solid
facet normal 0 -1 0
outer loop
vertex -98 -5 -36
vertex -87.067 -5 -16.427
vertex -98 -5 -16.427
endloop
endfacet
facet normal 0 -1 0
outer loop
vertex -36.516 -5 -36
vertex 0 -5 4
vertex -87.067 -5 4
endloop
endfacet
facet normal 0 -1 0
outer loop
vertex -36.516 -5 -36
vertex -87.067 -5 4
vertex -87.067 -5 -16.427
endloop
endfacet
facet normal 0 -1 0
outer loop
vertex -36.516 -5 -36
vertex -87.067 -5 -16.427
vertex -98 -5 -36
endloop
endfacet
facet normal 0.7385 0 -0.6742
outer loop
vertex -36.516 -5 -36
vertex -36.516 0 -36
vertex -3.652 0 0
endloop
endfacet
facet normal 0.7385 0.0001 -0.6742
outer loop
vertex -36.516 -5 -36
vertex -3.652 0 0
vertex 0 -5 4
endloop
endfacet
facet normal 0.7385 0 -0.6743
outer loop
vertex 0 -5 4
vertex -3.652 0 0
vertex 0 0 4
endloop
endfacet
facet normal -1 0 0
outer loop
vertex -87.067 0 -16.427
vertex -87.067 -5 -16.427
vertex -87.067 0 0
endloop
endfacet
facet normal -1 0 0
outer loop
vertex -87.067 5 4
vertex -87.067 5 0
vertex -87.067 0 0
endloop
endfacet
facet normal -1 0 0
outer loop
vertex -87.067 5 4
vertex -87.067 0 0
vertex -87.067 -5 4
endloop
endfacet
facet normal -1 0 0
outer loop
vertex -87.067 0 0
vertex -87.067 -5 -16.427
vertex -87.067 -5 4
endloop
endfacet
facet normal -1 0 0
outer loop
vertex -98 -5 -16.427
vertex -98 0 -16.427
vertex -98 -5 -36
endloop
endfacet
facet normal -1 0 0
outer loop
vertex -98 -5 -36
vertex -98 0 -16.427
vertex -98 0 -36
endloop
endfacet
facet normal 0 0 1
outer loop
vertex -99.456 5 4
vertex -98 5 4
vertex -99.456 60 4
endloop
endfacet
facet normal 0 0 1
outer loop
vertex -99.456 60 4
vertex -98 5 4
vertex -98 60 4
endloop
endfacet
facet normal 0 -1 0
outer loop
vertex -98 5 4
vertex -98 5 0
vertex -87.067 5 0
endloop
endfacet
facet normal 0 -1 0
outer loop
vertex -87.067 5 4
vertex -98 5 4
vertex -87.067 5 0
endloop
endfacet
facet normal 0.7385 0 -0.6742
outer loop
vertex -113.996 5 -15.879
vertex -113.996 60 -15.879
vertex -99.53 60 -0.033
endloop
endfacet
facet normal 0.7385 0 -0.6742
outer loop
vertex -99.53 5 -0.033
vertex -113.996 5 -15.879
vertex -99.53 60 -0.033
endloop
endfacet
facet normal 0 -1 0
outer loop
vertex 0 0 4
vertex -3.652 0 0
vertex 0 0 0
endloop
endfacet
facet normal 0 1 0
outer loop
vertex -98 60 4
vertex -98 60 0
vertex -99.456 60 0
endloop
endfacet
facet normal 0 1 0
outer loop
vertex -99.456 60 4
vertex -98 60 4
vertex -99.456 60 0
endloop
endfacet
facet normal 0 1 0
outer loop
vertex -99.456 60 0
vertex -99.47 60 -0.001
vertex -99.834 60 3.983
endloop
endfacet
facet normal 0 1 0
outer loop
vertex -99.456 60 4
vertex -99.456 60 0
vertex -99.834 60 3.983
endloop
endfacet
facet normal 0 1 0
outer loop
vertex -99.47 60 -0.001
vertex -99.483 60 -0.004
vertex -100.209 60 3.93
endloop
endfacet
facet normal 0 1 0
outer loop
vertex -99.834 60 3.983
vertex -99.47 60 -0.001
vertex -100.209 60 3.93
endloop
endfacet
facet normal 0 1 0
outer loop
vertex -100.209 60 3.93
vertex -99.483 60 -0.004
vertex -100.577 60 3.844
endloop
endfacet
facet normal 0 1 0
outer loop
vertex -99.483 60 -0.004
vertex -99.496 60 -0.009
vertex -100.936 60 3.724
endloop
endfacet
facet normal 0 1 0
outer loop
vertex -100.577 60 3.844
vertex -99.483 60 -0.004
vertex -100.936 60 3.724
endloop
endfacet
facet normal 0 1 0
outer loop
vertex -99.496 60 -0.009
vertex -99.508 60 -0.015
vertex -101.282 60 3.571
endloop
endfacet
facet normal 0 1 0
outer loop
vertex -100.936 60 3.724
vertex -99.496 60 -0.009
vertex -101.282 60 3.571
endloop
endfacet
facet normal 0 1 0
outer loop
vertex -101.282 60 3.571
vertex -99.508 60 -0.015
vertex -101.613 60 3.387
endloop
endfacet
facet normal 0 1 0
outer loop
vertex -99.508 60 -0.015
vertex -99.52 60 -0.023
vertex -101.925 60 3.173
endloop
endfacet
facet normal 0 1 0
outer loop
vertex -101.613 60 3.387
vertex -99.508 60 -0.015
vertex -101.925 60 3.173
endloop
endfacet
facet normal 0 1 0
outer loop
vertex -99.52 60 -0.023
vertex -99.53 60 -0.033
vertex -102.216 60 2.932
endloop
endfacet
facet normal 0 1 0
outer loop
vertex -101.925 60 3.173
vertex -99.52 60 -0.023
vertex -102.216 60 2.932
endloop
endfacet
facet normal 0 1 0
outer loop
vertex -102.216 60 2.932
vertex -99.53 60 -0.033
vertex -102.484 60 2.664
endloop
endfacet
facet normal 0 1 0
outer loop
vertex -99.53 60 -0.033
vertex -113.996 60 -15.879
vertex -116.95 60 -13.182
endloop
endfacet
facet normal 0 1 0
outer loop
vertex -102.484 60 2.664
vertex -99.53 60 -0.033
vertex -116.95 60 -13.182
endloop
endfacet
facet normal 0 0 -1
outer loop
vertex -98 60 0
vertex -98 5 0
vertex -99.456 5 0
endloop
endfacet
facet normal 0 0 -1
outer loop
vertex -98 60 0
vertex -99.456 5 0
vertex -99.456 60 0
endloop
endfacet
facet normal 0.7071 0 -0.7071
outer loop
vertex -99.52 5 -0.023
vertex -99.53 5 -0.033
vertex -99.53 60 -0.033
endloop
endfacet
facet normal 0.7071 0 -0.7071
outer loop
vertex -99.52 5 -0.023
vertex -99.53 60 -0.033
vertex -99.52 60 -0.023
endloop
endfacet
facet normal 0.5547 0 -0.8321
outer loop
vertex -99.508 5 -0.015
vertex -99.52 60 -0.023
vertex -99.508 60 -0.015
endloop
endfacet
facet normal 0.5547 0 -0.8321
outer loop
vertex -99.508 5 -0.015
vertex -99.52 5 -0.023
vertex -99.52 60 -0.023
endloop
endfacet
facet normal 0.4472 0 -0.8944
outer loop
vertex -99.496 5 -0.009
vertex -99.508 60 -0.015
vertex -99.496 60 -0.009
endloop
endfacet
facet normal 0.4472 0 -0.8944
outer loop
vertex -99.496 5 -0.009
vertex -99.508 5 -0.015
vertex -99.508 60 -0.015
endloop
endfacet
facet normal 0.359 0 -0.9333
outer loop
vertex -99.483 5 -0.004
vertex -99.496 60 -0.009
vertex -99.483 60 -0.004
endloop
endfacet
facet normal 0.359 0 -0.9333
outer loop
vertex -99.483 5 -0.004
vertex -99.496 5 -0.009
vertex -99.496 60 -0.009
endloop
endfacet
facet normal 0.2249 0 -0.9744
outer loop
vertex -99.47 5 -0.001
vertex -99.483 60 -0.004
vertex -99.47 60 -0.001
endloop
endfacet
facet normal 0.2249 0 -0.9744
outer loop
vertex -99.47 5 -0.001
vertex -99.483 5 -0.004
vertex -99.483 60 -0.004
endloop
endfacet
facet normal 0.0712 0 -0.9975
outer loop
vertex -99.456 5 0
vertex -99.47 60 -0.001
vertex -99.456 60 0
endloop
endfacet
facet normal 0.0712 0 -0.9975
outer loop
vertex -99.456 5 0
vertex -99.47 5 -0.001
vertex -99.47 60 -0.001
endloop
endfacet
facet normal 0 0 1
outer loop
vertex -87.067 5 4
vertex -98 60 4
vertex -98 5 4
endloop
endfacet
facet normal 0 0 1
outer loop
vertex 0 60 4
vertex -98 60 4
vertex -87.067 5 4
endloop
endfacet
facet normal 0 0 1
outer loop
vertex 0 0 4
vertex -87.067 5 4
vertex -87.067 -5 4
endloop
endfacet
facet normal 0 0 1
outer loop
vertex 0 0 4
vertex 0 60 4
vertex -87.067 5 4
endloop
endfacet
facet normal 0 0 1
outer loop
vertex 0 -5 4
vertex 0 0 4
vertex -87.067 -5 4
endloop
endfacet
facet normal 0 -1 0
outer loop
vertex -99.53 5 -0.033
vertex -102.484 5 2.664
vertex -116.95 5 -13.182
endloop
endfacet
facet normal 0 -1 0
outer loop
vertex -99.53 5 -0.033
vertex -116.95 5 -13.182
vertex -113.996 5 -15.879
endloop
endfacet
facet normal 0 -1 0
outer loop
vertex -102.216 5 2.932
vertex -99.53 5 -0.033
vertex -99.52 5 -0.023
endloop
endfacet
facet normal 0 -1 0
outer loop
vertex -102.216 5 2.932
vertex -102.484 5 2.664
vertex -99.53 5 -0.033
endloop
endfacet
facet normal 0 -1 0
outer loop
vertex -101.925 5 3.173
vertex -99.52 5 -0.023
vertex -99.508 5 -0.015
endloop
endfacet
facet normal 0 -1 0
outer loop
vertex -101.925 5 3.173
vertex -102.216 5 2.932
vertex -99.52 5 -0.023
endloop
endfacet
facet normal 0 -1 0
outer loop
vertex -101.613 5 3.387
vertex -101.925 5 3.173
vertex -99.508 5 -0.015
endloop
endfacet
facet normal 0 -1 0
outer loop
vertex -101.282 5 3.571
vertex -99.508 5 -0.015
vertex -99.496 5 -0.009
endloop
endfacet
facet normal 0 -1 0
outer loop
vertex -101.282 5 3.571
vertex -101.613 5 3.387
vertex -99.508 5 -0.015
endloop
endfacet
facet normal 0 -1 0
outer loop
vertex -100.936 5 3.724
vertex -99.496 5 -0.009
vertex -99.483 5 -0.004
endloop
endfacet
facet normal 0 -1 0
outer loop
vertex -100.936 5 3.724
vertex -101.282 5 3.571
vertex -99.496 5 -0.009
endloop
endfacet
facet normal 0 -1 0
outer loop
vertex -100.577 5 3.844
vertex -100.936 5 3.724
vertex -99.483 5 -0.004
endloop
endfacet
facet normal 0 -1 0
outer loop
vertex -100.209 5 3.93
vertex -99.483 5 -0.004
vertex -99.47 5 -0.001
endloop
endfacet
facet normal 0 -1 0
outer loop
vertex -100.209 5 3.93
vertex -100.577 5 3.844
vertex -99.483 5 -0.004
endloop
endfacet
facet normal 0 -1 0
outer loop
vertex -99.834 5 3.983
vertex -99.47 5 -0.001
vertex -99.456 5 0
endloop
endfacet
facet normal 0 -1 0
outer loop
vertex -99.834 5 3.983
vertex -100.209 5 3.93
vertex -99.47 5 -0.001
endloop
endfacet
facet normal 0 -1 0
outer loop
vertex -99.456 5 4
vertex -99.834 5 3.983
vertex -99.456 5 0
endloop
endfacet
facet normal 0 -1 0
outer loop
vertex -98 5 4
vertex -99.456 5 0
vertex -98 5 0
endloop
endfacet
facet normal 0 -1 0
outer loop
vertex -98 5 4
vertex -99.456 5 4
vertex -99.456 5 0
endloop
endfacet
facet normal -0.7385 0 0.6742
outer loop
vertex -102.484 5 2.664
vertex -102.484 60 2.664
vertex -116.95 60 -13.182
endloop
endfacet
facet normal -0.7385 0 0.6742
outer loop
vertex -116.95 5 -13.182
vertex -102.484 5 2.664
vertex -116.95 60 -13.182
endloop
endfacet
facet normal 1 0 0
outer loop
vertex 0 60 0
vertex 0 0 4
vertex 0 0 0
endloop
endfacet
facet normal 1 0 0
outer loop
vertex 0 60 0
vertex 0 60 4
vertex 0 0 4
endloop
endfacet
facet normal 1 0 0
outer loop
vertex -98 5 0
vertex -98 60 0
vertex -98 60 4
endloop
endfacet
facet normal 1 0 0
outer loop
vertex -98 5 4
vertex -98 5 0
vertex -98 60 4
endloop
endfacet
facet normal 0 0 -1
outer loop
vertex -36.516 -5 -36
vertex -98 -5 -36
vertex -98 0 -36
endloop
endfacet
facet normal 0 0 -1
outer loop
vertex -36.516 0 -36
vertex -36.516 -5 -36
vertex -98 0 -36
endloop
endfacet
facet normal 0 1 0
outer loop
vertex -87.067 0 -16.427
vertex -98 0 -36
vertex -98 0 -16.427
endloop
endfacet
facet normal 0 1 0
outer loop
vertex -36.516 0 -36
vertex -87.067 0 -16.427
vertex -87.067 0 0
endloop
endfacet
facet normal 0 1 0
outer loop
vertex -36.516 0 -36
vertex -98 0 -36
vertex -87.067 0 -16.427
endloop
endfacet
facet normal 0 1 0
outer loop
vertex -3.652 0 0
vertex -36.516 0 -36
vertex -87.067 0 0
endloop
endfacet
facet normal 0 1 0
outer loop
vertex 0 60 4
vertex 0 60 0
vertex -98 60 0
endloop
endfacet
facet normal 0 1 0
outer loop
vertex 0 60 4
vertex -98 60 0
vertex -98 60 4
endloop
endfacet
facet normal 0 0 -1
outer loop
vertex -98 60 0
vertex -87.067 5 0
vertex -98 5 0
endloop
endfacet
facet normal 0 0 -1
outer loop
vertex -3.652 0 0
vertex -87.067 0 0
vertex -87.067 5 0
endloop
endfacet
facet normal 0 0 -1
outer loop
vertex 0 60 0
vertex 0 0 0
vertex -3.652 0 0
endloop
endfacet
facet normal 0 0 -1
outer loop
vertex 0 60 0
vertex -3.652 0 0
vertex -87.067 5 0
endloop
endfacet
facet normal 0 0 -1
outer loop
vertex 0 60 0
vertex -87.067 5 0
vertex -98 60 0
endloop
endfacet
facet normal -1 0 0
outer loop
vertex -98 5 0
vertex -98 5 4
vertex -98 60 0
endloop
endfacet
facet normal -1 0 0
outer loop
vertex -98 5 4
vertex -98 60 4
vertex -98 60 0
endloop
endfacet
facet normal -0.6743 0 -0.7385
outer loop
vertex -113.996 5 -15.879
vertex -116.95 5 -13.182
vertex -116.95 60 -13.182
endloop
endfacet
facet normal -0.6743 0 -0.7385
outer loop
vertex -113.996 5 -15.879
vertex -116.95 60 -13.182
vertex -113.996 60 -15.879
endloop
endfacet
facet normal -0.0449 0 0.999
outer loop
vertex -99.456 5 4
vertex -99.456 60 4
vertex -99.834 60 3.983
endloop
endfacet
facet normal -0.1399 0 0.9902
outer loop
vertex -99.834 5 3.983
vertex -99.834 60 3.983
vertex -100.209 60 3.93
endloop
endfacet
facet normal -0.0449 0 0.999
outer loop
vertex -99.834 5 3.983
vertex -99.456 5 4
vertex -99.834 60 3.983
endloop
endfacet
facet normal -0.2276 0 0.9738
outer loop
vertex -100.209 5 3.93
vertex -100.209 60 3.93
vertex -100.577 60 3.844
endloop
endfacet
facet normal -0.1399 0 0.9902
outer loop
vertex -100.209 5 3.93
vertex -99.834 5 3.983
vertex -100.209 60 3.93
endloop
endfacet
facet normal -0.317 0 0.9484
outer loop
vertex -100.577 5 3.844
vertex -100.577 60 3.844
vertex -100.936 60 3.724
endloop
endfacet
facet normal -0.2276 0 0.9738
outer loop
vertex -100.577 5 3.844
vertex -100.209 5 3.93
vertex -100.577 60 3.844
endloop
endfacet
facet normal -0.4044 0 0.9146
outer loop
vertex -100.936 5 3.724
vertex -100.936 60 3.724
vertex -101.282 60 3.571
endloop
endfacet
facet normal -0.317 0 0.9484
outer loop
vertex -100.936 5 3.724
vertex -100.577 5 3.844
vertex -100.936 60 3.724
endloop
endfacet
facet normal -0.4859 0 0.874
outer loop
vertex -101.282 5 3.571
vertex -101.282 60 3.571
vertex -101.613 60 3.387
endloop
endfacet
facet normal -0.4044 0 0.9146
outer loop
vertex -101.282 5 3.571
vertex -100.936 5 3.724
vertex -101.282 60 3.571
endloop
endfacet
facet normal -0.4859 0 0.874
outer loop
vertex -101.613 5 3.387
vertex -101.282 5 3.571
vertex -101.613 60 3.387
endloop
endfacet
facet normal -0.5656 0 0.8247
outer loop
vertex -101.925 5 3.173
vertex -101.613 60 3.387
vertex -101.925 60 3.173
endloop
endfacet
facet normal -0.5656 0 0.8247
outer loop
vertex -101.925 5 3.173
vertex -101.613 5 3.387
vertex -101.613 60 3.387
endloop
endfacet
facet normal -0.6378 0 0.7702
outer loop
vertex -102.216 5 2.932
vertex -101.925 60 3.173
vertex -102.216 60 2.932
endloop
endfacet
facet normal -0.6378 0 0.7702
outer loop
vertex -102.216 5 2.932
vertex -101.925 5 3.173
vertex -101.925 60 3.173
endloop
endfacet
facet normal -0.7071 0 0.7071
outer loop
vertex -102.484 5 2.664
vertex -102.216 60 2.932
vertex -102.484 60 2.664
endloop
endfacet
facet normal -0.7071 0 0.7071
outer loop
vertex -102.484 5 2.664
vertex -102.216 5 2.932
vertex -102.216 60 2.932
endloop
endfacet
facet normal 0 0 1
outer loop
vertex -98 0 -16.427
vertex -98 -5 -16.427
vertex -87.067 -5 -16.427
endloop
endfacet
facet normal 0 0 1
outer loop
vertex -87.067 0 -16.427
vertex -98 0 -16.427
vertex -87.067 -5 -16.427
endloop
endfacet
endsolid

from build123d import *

# Parameters (mm, degrees)
EXTRUDE_1_DEPTH                  = 98
CUT_EXTRUDE_1_DEPTH              = 121.415945788
CUT_EXTRUDE_START                = 5
SKETCH_3_W                       = 12.842534068
SKETCH_3_H                       = 17.787416892
CUT_EXTRUDE_2_DEPTH              = 126.415945788
SKETCH_4_W                       = 4
SKETCH_4_H                       = 65
SM_BASE_FLANGE_1_DEPTH           = 1.5
SM_EDGE_FLANGE_1_STRIP_CUT_DEPTH = 65
SM_EDGE_FLANGE_1_DEPTH           = 65
SKETCH_9_W                       = 52.119762768
SKETCH_9_H                       = 22.239484817
CUT_EXTRUDE_2_2_DEPTH            = 10


# Sheet-metal steps are written as plain solids
with BuildPart() as part:
    # Sketch 1 → Вытянуть1 (new body)
    with BuildSketch(Plane(origin=(0, 0, 0), x_dir=(0, 0, -1), z_dir=(1, 0, 0))):
        Polygon((0, 0), (0, 60), (-4, 60), (-4, -5), (36, -5), (36, 0), align=None)
    extrude(amount=-EXTRUDE_1_DEPTH)

    # Эскиз2 → Вырез-Вытянуть1 (cut, through all)
    with BuildSketch(Plane(origin=(0, 0, 0), x_dir=(1, 0, 0), z_dir=(0, 1, 0))):
        Polygon((0, -4), (0, 52.377582957), (-36.515857127, 36), align=None)
    extrude(amount=-CUT_EXTRUDE_1_DEPTH, mode=Mode.SUBTRACT)

    # Эскиз3 → Cut-Extrude 2 (cut, through all)
    with BuildSketch(Plane(origin=(0, 0, 0), x_dir=(1, 0, 0), z_dir=(0, 1, 0)).offset(CUT_EXTRUDE_START)):
        with Locations((-93.575487089, 6.916408518)):
            Rectangle(SKETCH_3_W, SKETCH_3_H)
    extrude(amount=-CUT_EXTRUDE_2_DEPTH, mode=Mode.SUBTRACT)


with BuildPart() as body_2:
    # Эскиз4 → Базовая кромка1 (new body)
    with BuildSketch(Plane.ZY.offset(98)):
        with Locations((2, 27.5)):
            Rectangle(SKETCH_4_W, SKETCH_4_H)
    extrude(amount=SM_BASE_FLANGE_1_DEPTH)

    # Ребро-кромка1 strip (across the edge) → Ребро-кромка1 strip cut (cut)
    with BuildSketch(Plane(origin=(-99.5, -5, 0), x_dir=(0.7385395687806503, 0, -0.6742101344130709), z_dir=(0, 1, 0))):
        Polygon((-14.628602565, 7.938304662), (-2.664261551, -2.983899516), (0.032578987, -0.02974124), (-11.931762028, 10.892462937), align=None)
    extrude(amount=SM_EDGE_FLANGE_1_STRIP_CUT_DEPTH, mode=Mode.SUBTRACT)

    # Ребро-кромка1 section (across the edge) → Ребро-кромка1 (add)
    with BuildSketch(Plane(origin=(-99.5, -5, 0), x_dir=(0.7385395687806503, 0, -0.6742101344130709), z_dir=(0, 1, 0))):
        with BuildLine():
            Line((-4, 0.044112716), (-4, 21.5))
            Line((-4, 21.5), (0, 21.5))
            Line((0, 21.5), (0, 0.044112716))
            ThreePointArc((0, 0.044112716), (0.008506554, 0.003752472), (0.032578987, -0.02974124))
            Line((0.032578987, -0.02974124), (-2.664261551, -2.983899516))
            ThreePointArc((-2.664261551, -2.983899516), (-3.651231288, -1.610657304), (-4, 0.044112716))
        make_face()
    extrude(amount=SM_EDGE_FLANGE_1_DEPTH)


with BuildPart() as cut_extrude_2_2_tool:
    # Эскиз9 → Cut-Extrude 2 2 (new body)
    with BuildSketch(Plane.XZ.offset(5)):
        with Locations((-113.12645526, -5.307596352)):
            Rectangle(SKETCH_9_W, SKETCH_9_H)
    extrude(amount=-CUT_EXTRUDE_2_2_DEPTH)


with BuildPart() as part_1:
    add(part.part)

    # Cut-Extrude 2 2: cut by cut_extrude_2_2_tool
    add(cut_extrude_2_2_tool.part, mode=Mode.SUBTRACT)


with BuildPart() as body_2_1:
    add(body_2.part)

    # Cut-Extrude 2 2: cut by cut_extrude_2_2_tool
    add(cut_extrude_2_2_tool.part, mode=Mode.SUBTRACT)


solid = Compound([part_1.part, body_2_1.part])
